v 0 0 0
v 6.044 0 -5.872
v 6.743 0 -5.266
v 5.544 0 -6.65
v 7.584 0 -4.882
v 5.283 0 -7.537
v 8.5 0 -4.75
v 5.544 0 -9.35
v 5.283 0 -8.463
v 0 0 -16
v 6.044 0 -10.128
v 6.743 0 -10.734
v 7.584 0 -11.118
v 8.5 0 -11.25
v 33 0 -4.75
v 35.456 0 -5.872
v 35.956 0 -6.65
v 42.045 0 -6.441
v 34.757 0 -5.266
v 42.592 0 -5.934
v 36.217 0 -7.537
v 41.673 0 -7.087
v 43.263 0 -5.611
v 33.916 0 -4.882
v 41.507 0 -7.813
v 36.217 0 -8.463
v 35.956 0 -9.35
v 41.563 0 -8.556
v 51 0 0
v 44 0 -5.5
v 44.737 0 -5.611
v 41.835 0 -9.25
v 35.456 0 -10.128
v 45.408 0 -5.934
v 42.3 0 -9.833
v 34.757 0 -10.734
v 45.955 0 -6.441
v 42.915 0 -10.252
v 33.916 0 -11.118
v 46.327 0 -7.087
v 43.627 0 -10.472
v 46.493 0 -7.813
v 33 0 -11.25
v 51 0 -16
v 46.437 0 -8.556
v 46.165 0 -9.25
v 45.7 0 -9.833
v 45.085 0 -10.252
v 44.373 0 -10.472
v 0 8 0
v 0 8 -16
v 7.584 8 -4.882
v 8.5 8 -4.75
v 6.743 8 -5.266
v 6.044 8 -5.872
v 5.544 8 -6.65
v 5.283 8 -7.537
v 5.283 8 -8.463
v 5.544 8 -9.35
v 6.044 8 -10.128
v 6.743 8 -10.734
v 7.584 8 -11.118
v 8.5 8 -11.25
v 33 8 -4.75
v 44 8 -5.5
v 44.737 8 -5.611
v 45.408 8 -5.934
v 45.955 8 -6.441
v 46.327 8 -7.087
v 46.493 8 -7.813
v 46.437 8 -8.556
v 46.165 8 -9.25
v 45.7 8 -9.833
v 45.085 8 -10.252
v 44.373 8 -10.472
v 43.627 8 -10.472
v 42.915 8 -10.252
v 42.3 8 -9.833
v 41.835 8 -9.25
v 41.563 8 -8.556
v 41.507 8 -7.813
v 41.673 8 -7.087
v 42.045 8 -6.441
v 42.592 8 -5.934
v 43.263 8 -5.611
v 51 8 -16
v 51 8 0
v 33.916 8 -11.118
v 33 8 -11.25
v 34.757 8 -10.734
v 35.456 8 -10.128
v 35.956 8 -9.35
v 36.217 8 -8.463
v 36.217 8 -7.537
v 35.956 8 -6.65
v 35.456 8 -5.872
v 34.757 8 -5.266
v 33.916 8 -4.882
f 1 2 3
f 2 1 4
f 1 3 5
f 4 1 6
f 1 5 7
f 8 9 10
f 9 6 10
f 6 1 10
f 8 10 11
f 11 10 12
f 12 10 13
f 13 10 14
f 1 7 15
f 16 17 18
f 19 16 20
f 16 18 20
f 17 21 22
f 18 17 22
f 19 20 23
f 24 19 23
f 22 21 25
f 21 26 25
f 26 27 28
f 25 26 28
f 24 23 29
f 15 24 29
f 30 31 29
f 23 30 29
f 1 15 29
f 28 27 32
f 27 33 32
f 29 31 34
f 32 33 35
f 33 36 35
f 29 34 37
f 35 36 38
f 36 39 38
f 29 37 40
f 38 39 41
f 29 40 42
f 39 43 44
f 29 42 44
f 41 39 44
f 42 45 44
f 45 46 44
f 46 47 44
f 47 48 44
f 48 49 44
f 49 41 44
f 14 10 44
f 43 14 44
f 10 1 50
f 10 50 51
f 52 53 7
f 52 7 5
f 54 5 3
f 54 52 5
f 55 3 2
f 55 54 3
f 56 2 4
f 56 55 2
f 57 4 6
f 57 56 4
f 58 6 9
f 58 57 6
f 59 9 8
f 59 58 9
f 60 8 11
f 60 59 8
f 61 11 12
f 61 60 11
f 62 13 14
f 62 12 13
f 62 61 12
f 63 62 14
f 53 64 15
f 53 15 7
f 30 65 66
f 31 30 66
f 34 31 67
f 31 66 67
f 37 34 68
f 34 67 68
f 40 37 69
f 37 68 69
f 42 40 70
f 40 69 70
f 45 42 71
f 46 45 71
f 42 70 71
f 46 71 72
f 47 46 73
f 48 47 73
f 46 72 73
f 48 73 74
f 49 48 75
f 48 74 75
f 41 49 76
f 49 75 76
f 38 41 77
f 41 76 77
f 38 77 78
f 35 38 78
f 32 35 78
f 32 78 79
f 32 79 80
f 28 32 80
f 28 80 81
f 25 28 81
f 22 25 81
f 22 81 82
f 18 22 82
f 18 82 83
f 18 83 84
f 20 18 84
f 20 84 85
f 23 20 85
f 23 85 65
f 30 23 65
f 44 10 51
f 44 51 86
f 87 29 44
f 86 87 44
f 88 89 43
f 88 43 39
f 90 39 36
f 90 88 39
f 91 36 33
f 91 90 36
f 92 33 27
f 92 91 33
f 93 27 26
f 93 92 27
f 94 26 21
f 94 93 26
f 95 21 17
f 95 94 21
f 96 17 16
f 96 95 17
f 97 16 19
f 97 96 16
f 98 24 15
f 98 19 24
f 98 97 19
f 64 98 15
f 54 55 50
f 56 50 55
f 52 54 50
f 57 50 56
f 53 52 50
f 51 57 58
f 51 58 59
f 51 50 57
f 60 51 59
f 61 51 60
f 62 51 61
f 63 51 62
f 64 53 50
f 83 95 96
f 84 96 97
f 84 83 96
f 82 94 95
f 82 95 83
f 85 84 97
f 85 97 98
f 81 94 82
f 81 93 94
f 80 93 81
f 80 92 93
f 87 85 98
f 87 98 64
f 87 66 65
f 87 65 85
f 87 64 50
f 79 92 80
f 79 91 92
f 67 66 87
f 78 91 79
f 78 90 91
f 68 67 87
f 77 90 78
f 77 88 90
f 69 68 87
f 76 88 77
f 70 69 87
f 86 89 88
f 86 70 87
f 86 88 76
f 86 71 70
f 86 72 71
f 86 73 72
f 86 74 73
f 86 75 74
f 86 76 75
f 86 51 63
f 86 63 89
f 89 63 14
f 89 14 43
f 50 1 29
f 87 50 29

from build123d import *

# Parameters (mm, degrees)
CROQUIS3_W              = 51
CROQUIS3_H              = 16
SALIENTE_EXTRUIR1_DEPTH = 8
CORTAR_EXTRUIR4_DEPTH   = 55.046276467
CROQUIS32_R             = 2.5
CORTAR_EXTRUIR6_DEPTH   = 55.046276467


with BuildPart() as part:
    # Croquis3 → Saliente-Extruir1 (new body)
    with BuildSketch(Plane(origin=(0, 0, 0), x_dir=(1, 0, 0), z_dir=(0, 1, 0))):
        with Locations((25.5, 8)):
            Rectangle(CROQUIS3_W, CROQUIS3_H)
    extrude(amount=SALIENTE_EXTRUIR1_DEPTH)

    # Croquis15 → Cortar-Extruir4 (cut, through all)
    with BuildSketch(Plane(origin=(0, 8, 0), x_dir=(1, 0, 0), z_dir=(0, 1, 0))):
        with BuildLine():
            Line((8.5, 11.25), (33, 11.25))
            ThreePointArc((33, 11.25), (36.25, 8), (33, 4.75))
            Line((33, 4.75), (8.5, 4.75))
            ThreePointArc((8.5, 4.75), (5.25, 8), (8.5, 11.25))
        make_face()
    extrude(amount=-CORTAR_EXTRUIR4_DEPTH, mode=Mode.SUBTRACT)

    # Croquis32 → Cortar-Extruir6 (cut, through all)
    with BuildSketch(Plane(origin=(0, 8, 0), x_dir=(1, 0, 0), z_dir=(0, 1, 0))):
        with Locations(Location((44, 8, 0), (0, 0, 270))):
            Circle(CROQUIS32_R)
    extrude(amount=-CORTAR_EXTRUIR6_DEPTH, mode=Mode.SUBTRACT)


solid = part.part
